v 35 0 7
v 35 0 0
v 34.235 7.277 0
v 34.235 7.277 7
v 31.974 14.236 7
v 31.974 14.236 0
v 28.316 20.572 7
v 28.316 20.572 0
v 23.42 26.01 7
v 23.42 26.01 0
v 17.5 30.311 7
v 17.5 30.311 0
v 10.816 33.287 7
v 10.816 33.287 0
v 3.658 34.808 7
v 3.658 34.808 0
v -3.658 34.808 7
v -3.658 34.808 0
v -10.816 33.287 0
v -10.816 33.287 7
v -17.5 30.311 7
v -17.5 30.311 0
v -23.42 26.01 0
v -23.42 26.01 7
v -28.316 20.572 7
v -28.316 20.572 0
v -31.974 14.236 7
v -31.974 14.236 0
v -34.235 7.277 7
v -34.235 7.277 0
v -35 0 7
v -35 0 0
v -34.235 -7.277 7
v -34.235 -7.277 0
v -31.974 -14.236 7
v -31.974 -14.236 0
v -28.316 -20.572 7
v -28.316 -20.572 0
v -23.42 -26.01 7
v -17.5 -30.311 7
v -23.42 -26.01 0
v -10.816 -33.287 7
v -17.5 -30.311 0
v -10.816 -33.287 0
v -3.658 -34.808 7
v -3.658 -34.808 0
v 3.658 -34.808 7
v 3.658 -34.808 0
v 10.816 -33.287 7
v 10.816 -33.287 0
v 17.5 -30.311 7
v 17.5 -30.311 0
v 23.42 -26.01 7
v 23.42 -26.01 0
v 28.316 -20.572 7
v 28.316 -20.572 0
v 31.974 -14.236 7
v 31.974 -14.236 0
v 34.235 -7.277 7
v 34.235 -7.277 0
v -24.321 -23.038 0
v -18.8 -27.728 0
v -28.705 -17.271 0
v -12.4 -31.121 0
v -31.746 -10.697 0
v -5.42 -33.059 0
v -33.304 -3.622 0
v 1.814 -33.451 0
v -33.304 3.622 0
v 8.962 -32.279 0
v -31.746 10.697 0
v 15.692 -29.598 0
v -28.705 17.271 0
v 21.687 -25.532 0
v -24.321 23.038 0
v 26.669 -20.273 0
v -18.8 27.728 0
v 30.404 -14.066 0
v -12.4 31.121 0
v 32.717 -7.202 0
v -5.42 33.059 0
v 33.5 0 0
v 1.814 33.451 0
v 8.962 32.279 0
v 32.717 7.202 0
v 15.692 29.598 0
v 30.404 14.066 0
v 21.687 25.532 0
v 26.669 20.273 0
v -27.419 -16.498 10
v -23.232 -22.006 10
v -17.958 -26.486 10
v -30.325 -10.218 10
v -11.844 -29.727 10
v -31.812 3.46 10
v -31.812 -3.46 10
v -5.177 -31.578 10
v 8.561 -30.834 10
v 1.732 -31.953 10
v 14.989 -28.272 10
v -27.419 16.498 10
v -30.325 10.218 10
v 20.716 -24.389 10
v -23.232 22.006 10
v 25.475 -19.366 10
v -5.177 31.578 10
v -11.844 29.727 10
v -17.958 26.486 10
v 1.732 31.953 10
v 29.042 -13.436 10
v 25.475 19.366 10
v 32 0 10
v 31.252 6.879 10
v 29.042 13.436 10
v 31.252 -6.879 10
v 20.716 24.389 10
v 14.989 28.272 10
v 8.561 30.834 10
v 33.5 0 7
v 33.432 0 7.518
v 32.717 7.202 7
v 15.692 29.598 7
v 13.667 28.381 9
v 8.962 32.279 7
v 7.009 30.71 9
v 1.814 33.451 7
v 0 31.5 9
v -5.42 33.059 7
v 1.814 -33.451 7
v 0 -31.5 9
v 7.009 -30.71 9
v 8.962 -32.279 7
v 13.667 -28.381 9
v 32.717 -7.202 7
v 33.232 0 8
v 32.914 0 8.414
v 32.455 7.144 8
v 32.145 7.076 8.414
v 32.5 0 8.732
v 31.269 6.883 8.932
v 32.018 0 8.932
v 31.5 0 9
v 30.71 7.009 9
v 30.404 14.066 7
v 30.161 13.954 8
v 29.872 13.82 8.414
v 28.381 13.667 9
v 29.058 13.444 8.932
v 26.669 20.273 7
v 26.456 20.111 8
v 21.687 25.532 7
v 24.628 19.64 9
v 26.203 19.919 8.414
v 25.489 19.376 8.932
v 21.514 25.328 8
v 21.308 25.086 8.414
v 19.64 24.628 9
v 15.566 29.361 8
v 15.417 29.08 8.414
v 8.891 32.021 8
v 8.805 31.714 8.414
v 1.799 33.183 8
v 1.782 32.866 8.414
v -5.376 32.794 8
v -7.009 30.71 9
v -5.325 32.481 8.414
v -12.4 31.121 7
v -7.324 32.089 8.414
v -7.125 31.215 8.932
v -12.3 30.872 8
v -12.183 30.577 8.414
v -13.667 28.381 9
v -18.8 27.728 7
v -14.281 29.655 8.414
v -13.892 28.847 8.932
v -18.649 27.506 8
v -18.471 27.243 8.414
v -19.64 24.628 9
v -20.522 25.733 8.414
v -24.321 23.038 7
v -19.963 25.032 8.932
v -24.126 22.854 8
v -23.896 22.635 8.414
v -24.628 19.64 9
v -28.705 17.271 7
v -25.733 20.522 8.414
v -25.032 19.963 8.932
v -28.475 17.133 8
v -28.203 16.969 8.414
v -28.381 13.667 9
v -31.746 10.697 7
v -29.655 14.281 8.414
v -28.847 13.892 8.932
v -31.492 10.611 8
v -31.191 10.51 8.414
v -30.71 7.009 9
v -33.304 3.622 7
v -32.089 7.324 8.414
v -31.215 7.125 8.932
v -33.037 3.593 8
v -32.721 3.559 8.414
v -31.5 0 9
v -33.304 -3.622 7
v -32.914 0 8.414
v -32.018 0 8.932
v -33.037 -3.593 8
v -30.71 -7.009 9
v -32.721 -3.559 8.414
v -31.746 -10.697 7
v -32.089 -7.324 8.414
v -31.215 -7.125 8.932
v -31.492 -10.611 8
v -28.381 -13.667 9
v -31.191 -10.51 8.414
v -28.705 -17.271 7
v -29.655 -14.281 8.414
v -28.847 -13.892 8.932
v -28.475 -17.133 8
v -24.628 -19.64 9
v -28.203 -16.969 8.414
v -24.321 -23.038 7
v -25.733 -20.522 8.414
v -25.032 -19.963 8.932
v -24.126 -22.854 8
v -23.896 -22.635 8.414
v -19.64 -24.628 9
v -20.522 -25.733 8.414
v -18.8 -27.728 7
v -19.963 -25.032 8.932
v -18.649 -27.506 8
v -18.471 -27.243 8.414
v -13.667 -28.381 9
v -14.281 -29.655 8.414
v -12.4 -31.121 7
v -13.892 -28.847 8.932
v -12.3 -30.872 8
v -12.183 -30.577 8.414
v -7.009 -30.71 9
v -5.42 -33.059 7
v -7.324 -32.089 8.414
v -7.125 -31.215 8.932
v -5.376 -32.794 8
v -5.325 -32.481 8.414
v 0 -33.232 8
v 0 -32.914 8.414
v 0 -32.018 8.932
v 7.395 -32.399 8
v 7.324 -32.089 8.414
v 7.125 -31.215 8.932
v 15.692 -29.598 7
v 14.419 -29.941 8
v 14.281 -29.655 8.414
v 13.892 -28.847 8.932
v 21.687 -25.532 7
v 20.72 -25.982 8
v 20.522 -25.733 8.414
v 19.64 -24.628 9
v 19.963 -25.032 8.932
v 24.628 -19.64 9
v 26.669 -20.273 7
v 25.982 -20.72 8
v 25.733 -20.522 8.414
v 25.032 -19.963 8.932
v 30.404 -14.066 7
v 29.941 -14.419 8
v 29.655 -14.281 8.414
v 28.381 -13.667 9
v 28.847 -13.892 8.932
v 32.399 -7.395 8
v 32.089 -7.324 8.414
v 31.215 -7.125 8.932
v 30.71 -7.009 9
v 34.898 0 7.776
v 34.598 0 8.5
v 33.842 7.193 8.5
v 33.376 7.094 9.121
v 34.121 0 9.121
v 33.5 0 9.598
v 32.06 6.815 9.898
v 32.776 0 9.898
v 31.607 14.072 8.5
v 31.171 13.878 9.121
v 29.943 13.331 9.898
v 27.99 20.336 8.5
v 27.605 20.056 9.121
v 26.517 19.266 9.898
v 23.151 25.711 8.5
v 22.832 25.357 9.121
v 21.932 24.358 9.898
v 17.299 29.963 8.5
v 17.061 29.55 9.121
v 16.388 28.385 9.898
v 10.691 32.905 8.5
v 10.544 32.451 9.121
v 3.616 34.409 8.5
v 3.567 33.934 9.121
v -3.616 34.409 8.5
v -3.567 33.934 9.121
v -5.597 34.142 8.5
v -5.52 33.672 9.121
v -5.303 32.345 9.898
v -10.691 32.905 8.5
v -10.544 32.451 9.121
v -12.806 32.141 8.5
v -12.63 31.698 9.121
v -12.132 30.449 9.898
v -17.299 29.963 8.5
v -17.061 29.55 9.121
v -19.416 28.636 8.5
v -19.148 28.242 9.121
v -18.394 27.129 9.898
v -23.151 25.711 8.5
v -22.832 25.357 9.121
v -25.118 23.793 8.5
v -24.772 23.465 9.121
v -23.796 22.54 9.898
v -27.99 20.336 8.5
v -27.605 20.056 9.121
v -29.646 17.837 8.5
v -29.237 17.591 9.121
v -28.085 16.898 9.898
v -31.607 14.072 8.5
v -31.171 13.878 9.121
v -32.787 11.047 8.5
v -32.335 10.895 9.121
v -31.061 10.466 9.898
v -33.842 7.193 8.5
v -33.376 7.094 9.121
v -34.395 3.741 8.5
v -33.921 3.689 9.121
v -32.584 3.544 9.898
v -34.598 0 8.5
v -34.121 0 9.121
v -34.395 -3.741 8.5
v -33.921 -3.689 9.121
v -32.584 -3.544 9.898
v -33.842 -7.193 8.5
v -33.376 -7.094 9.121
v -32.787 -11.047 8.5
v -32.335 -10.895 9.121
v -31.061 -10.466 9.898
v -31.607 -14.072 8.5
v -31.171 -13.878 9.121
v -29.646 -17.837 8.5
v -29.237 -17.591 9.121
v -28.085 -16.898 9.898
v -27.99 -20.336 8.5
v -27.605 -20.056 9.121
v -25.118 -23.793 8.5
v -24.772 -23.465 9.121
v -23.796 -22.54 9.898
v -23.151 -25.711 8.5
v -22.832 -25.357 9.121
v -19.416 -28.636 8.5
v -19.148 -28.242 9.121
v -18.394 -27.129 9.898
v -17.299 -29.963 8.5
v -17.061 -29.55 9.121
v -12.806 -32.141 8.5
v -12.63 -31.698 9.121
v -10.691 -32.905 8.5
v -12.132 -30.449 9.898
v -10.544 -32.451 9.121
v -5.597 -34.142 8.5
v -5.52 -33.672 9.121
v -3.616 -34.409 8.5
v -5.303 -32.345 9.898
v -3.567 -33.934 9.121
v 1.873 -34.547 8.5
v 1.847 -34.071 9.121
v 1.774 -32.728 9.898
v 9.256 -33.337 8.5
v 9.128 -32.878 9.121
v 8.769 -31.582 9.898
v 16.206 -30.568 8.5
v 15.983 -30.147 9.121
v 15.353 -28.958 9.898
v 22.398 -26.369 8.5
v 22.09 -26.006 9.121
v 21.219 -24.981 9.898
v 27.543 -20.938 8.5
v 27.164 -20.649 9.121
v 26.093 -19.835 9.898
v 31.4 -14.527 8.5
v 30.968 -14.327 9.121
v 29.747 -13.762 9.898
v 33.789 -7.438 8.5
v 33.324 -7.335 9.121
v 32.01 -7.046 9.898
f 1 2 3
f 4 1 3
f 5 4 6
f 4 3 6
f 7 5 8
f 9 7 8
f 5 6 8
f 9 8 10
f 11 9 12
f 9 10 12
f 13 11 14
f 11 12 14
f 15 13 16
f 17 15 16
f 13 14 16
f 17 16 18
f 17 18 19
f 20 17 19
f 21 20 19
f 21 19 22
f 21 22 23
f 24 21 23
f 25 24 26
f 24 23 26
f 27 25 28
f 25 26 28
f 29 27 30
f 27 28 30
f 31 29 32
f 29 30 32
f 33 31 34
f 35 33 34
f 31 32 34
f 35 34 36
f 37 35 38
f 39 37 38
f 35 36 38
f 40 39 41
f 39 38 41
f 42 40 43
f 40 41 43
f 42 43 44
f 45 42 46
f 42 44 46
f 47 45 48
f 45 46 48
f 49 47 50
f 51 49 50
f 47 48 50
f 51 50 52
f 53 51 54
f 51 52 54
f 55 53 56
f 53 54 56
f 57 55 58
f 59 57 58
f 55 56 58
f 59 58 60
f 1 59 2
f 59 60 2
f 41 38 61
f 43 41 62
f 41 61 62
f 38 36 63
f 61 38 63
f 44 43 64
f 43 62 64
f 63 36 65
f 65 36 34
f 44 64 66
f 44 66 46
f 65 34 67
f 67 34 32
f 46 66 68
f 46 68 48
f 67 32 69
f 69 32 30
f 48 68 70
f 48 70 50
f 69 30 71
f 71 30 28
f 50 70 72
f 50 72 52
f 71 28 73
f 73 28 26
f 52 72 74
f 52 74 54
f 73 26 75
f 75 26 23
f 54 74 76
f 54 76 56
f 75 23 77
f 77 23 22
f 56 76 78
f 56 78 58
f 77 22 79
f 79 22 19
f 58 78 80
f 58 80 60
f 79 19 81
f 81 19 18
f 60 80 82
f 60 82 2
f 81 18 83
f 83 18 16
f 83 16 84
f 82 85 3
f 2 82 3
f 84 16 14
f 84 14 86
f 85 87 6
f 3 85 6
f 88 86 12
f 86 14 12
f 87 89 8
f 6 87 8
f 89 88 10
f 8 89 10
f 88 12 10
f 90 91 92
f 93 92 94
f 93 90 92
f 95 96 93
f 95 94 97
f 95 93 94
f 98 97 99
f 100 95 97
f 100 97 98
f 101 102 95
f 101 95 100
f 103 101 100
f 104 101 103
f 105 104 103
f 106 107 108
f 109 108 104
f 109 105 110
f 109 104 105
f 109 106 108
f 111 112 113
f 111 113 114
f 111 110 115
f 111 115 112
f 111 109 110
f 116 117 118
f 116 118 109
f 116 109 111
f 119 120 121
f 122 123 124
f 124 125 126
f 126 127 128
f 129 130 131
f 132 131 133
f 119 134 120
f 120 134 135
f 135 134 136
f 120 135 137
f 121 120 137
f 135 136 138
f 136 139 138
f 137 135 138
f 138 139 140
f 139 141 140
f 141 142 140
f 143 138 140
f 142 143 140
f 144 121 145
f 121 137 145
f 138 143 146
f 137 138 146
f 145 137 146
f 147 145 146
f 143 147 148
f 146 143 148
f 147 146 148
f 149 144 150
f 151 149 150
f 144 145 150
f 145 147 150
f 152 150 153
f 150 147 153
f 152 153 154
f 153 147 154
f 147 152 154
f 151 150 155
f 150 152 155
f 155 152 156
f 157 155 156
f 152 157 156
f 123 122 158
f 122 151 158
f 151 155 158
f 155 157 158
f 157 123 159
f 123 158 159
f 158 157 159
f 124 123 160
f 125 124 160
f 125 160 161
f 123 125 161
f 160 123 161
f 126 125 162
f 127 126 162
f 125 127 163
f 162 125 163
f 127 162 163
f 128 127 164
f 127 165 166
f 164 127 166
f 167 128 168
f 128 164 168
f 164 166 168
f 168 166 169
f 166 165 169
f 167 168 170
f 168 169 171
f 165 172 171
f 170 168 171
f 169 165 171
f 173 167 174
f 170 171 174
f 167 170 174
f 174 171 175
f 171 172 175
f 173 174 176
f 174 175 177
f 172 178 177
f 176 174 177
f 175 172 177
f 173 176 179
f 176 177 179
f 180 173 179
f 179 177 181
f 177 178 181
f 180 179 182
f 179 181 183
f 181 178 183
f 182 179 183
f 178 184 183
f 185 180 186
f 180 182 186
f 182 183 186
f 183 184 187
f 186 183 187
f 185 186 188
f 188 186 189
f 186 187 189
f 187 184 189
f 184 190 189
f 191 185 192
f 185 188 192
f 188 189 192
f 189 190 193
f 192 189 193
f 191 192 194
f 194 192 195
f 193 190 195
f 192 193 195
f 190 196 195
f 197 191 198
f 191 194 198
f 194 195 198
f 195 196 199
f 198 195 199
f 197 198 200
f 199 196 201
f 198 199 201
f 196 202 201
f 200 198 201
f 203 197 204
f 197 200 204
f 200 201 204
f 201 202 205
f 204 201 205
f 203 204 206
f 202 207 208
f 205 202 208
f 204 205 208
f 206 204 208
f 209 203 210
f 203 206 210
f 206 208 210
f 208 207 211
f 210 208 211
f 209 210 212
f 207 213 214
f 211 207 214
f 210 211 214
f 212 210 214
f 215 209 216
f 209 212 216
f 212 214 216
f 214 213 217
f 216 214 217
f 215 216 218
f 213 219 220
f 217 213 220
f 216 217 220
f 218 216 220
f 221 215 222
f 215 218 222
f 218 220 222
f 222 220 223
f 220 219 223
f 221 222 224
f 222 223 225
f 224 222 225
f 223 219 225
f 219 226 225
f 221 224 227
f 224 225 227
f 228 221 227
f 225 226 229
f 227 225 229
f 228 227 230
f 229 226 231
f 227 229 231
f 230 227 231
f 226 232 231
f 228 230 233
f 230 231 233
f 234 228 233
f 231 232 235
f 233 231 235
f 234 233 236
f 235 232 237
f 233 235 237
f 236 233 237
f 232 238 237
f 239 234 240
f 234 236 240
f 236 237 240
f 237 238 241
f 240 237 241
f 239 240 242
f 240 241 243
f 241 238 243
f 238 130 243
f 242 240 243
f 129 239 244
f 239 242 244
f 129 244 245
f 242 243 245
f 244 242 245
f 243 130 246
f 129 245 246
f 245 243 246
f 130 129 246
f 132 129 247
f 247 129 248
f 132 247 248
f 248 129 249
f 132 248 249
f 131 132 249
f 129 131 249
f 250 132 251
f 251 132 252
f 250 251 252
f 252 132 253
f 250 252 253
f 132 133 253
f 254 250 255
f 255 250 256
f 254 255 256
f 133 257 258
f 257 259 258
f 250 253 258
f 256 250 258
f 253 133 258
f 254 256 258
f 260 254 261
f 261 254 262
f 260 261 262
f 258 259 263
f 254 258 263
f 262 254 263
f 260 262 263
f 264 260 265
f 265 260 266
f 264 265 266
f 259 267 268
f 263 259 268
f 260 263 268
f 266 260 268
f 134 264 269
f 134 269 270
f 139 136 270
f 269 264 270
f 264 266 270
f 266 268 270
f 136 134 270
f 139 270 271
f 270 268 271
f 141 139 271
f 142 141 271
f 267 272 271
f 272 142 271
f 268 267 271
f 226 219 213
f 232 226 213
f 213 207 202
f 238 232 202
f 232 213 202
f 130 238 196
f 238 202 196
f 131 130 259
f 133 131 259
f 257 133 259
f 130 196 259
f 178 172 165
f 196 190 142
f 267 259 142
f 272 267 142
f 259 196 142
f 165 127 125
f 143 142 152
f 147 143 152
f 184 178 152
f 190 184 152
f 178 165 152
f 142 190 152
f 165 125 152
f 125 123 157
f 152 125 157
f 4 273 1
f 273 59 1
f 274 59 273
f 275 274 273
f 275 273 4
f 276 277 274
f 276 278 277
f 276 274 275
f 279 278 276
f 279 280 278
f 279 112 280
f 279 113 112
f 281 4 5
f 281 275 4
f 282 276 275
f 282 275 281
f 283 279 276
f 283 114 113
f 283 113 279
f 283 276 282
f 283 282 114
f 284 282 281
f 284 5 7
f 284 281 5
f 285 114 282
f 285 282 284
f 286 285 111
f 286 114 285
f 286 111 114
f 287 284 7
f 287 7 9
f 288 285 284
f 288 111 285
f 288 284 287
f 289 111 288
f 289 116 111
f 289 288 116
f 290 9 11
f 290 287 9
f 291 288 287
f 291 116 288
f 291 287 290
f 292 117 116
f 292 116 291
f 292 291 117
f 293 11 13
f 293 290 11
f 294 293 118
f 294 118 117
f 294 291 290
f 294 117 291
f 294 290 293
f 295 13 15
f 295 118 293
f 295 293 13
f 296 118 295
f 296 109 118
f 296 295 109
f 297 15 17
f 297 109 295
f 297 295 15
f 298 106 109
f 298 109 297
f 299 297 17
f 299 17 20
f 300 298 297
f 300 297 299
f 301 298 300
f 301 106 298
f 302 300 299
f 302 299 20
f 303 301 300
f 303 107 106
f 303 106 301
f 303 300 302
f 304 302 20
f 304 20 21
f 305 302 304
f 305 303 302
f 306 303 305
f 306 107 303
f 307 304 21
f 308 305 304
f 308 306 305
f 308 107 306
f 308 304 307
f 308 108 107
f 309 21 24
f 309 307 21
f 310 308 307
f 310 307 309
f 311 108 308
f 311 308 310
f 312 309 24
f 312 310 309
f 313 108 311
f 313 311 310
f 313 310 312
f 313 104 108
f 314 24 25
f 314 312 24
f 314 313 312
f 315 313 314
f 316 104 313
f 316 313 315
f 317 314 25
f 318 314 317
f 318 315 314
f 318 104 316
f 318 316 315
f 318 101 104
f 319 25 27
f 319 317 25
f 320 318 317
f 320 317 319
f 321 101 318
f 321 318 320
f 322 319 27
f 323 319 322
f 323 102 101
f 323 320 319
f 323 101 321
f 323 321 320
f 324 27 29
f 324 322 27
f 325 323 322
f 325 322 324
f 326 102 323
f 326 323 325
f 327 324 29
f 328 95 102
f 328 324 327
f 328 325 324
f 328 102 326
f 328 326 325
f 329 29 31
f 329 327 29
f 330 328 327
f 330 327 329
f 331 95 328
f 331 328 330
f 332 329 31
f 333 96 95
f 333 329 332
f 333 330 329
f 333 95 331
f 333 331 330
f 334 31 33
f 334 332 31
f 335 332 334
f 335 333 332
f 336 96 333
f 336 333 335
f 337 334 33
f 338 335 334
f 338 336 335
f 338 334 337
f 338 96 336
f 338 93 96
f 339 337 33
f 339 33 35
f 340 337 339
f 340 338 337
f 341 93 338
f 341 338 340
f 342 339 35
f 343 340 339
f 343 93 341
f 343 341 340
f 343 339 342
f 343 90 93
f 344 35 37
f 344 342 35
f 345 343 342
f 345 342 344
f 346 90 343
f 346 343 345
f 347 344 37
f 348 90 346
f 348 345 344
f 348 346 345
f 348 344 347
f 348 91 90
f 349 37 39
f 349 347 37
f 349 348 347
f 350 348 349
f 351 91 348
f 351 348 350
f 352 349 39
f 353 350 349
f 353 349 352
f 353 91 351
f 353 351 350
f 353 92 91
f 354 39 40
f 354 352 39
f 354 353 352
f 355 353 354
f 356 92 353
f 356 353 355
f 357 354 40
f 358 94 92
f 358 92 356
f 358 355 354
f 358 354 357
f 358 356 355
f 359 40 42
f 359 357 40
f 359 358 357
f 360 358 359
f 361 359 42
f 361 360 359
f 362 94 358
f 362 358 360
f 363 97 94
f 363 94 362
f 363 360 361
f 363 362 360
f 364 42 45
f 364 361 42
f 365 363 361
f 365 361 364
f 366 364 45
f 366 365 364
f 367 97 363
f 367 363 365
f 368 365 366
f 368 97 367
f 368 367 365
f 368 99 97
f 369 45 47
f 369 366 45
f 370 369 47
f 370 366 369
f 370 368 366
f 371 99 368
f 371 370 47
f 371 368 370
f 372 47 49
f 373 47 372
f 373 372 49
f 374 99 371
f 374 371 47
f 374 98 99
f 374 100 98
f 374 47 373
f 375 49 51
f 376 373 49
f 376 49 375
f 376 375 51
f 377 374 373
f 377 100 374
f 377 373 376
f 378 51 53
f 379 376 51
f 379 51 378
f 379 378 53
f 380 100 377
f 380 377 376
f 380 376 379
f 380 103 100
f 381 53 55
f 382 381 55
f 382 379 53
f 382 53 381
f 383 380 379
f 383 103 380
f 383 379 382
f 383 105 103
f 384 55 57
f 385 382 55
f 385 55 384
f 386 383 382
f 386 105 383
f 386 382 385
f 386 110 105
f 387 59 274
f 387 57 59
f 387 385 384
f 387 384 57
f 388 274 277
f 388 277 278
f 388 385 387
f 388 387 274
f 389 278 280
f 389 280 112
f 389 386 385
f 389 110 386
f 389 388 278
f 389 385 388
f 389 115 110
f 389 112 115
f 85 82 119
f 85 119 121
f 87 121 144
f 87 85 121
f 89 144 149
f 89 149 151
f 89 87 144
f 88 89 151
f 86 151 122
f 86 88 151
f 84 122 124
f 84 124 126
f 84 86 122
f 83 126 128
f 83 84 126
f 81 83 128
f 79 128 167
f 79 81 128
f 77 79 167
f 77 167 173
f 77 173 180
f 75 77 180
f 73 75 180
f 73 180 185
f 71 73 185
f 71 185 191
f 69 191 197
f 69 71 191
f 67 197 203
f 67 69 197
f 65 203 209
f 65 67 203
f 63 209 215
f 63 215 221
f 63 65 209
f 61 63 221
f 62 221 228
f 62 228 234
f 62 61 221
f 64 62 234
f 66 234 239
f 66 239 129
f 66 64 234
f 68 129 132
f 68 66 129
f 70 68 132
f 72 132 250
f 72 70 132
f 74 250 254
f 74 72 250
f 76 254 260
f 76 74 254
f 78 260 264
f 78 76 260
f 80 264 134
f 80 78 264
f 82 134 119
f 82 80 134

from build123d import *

# Parameters (mm, degrees)
SKETCH001_R  = 35
PAD_DEPTH    = 10
FILLET_R     = 3
SKETCH_R     = 33.5
POCKET_DEPTH = 9
FILLET001_R  = 2


with BuildPart() as part:
    # Sketch001 → Pad (new body)
    with BuildSketch(Plane.XY):
        Circle(SKETCH001_R)
    extrude(amount=PAD_DEPTH)

    # Fillet
    fillet_edges = [part.edges().sort_by_distance(p)[0] for p in [
        (-35, 0, 10),
    ]]
    fillet(fillet_edges, radius=FILLET_R)

    # Sketch → Pocket (cut)
    with BuildSketch(Plane.XY):
        Circle(SKETCH_R)
    extrude(amount=POCKET_DEPTH, mode=Mode.SUBTRACT)

    # Fillet001
    fillet001_edges = [part.edges().sort_by_distance(p)[0] for p in [
        (-33.5, 0, 9),
    ]]
    fillet(fillet001_edges, radius=FILLET001_R)


solid = part.part
